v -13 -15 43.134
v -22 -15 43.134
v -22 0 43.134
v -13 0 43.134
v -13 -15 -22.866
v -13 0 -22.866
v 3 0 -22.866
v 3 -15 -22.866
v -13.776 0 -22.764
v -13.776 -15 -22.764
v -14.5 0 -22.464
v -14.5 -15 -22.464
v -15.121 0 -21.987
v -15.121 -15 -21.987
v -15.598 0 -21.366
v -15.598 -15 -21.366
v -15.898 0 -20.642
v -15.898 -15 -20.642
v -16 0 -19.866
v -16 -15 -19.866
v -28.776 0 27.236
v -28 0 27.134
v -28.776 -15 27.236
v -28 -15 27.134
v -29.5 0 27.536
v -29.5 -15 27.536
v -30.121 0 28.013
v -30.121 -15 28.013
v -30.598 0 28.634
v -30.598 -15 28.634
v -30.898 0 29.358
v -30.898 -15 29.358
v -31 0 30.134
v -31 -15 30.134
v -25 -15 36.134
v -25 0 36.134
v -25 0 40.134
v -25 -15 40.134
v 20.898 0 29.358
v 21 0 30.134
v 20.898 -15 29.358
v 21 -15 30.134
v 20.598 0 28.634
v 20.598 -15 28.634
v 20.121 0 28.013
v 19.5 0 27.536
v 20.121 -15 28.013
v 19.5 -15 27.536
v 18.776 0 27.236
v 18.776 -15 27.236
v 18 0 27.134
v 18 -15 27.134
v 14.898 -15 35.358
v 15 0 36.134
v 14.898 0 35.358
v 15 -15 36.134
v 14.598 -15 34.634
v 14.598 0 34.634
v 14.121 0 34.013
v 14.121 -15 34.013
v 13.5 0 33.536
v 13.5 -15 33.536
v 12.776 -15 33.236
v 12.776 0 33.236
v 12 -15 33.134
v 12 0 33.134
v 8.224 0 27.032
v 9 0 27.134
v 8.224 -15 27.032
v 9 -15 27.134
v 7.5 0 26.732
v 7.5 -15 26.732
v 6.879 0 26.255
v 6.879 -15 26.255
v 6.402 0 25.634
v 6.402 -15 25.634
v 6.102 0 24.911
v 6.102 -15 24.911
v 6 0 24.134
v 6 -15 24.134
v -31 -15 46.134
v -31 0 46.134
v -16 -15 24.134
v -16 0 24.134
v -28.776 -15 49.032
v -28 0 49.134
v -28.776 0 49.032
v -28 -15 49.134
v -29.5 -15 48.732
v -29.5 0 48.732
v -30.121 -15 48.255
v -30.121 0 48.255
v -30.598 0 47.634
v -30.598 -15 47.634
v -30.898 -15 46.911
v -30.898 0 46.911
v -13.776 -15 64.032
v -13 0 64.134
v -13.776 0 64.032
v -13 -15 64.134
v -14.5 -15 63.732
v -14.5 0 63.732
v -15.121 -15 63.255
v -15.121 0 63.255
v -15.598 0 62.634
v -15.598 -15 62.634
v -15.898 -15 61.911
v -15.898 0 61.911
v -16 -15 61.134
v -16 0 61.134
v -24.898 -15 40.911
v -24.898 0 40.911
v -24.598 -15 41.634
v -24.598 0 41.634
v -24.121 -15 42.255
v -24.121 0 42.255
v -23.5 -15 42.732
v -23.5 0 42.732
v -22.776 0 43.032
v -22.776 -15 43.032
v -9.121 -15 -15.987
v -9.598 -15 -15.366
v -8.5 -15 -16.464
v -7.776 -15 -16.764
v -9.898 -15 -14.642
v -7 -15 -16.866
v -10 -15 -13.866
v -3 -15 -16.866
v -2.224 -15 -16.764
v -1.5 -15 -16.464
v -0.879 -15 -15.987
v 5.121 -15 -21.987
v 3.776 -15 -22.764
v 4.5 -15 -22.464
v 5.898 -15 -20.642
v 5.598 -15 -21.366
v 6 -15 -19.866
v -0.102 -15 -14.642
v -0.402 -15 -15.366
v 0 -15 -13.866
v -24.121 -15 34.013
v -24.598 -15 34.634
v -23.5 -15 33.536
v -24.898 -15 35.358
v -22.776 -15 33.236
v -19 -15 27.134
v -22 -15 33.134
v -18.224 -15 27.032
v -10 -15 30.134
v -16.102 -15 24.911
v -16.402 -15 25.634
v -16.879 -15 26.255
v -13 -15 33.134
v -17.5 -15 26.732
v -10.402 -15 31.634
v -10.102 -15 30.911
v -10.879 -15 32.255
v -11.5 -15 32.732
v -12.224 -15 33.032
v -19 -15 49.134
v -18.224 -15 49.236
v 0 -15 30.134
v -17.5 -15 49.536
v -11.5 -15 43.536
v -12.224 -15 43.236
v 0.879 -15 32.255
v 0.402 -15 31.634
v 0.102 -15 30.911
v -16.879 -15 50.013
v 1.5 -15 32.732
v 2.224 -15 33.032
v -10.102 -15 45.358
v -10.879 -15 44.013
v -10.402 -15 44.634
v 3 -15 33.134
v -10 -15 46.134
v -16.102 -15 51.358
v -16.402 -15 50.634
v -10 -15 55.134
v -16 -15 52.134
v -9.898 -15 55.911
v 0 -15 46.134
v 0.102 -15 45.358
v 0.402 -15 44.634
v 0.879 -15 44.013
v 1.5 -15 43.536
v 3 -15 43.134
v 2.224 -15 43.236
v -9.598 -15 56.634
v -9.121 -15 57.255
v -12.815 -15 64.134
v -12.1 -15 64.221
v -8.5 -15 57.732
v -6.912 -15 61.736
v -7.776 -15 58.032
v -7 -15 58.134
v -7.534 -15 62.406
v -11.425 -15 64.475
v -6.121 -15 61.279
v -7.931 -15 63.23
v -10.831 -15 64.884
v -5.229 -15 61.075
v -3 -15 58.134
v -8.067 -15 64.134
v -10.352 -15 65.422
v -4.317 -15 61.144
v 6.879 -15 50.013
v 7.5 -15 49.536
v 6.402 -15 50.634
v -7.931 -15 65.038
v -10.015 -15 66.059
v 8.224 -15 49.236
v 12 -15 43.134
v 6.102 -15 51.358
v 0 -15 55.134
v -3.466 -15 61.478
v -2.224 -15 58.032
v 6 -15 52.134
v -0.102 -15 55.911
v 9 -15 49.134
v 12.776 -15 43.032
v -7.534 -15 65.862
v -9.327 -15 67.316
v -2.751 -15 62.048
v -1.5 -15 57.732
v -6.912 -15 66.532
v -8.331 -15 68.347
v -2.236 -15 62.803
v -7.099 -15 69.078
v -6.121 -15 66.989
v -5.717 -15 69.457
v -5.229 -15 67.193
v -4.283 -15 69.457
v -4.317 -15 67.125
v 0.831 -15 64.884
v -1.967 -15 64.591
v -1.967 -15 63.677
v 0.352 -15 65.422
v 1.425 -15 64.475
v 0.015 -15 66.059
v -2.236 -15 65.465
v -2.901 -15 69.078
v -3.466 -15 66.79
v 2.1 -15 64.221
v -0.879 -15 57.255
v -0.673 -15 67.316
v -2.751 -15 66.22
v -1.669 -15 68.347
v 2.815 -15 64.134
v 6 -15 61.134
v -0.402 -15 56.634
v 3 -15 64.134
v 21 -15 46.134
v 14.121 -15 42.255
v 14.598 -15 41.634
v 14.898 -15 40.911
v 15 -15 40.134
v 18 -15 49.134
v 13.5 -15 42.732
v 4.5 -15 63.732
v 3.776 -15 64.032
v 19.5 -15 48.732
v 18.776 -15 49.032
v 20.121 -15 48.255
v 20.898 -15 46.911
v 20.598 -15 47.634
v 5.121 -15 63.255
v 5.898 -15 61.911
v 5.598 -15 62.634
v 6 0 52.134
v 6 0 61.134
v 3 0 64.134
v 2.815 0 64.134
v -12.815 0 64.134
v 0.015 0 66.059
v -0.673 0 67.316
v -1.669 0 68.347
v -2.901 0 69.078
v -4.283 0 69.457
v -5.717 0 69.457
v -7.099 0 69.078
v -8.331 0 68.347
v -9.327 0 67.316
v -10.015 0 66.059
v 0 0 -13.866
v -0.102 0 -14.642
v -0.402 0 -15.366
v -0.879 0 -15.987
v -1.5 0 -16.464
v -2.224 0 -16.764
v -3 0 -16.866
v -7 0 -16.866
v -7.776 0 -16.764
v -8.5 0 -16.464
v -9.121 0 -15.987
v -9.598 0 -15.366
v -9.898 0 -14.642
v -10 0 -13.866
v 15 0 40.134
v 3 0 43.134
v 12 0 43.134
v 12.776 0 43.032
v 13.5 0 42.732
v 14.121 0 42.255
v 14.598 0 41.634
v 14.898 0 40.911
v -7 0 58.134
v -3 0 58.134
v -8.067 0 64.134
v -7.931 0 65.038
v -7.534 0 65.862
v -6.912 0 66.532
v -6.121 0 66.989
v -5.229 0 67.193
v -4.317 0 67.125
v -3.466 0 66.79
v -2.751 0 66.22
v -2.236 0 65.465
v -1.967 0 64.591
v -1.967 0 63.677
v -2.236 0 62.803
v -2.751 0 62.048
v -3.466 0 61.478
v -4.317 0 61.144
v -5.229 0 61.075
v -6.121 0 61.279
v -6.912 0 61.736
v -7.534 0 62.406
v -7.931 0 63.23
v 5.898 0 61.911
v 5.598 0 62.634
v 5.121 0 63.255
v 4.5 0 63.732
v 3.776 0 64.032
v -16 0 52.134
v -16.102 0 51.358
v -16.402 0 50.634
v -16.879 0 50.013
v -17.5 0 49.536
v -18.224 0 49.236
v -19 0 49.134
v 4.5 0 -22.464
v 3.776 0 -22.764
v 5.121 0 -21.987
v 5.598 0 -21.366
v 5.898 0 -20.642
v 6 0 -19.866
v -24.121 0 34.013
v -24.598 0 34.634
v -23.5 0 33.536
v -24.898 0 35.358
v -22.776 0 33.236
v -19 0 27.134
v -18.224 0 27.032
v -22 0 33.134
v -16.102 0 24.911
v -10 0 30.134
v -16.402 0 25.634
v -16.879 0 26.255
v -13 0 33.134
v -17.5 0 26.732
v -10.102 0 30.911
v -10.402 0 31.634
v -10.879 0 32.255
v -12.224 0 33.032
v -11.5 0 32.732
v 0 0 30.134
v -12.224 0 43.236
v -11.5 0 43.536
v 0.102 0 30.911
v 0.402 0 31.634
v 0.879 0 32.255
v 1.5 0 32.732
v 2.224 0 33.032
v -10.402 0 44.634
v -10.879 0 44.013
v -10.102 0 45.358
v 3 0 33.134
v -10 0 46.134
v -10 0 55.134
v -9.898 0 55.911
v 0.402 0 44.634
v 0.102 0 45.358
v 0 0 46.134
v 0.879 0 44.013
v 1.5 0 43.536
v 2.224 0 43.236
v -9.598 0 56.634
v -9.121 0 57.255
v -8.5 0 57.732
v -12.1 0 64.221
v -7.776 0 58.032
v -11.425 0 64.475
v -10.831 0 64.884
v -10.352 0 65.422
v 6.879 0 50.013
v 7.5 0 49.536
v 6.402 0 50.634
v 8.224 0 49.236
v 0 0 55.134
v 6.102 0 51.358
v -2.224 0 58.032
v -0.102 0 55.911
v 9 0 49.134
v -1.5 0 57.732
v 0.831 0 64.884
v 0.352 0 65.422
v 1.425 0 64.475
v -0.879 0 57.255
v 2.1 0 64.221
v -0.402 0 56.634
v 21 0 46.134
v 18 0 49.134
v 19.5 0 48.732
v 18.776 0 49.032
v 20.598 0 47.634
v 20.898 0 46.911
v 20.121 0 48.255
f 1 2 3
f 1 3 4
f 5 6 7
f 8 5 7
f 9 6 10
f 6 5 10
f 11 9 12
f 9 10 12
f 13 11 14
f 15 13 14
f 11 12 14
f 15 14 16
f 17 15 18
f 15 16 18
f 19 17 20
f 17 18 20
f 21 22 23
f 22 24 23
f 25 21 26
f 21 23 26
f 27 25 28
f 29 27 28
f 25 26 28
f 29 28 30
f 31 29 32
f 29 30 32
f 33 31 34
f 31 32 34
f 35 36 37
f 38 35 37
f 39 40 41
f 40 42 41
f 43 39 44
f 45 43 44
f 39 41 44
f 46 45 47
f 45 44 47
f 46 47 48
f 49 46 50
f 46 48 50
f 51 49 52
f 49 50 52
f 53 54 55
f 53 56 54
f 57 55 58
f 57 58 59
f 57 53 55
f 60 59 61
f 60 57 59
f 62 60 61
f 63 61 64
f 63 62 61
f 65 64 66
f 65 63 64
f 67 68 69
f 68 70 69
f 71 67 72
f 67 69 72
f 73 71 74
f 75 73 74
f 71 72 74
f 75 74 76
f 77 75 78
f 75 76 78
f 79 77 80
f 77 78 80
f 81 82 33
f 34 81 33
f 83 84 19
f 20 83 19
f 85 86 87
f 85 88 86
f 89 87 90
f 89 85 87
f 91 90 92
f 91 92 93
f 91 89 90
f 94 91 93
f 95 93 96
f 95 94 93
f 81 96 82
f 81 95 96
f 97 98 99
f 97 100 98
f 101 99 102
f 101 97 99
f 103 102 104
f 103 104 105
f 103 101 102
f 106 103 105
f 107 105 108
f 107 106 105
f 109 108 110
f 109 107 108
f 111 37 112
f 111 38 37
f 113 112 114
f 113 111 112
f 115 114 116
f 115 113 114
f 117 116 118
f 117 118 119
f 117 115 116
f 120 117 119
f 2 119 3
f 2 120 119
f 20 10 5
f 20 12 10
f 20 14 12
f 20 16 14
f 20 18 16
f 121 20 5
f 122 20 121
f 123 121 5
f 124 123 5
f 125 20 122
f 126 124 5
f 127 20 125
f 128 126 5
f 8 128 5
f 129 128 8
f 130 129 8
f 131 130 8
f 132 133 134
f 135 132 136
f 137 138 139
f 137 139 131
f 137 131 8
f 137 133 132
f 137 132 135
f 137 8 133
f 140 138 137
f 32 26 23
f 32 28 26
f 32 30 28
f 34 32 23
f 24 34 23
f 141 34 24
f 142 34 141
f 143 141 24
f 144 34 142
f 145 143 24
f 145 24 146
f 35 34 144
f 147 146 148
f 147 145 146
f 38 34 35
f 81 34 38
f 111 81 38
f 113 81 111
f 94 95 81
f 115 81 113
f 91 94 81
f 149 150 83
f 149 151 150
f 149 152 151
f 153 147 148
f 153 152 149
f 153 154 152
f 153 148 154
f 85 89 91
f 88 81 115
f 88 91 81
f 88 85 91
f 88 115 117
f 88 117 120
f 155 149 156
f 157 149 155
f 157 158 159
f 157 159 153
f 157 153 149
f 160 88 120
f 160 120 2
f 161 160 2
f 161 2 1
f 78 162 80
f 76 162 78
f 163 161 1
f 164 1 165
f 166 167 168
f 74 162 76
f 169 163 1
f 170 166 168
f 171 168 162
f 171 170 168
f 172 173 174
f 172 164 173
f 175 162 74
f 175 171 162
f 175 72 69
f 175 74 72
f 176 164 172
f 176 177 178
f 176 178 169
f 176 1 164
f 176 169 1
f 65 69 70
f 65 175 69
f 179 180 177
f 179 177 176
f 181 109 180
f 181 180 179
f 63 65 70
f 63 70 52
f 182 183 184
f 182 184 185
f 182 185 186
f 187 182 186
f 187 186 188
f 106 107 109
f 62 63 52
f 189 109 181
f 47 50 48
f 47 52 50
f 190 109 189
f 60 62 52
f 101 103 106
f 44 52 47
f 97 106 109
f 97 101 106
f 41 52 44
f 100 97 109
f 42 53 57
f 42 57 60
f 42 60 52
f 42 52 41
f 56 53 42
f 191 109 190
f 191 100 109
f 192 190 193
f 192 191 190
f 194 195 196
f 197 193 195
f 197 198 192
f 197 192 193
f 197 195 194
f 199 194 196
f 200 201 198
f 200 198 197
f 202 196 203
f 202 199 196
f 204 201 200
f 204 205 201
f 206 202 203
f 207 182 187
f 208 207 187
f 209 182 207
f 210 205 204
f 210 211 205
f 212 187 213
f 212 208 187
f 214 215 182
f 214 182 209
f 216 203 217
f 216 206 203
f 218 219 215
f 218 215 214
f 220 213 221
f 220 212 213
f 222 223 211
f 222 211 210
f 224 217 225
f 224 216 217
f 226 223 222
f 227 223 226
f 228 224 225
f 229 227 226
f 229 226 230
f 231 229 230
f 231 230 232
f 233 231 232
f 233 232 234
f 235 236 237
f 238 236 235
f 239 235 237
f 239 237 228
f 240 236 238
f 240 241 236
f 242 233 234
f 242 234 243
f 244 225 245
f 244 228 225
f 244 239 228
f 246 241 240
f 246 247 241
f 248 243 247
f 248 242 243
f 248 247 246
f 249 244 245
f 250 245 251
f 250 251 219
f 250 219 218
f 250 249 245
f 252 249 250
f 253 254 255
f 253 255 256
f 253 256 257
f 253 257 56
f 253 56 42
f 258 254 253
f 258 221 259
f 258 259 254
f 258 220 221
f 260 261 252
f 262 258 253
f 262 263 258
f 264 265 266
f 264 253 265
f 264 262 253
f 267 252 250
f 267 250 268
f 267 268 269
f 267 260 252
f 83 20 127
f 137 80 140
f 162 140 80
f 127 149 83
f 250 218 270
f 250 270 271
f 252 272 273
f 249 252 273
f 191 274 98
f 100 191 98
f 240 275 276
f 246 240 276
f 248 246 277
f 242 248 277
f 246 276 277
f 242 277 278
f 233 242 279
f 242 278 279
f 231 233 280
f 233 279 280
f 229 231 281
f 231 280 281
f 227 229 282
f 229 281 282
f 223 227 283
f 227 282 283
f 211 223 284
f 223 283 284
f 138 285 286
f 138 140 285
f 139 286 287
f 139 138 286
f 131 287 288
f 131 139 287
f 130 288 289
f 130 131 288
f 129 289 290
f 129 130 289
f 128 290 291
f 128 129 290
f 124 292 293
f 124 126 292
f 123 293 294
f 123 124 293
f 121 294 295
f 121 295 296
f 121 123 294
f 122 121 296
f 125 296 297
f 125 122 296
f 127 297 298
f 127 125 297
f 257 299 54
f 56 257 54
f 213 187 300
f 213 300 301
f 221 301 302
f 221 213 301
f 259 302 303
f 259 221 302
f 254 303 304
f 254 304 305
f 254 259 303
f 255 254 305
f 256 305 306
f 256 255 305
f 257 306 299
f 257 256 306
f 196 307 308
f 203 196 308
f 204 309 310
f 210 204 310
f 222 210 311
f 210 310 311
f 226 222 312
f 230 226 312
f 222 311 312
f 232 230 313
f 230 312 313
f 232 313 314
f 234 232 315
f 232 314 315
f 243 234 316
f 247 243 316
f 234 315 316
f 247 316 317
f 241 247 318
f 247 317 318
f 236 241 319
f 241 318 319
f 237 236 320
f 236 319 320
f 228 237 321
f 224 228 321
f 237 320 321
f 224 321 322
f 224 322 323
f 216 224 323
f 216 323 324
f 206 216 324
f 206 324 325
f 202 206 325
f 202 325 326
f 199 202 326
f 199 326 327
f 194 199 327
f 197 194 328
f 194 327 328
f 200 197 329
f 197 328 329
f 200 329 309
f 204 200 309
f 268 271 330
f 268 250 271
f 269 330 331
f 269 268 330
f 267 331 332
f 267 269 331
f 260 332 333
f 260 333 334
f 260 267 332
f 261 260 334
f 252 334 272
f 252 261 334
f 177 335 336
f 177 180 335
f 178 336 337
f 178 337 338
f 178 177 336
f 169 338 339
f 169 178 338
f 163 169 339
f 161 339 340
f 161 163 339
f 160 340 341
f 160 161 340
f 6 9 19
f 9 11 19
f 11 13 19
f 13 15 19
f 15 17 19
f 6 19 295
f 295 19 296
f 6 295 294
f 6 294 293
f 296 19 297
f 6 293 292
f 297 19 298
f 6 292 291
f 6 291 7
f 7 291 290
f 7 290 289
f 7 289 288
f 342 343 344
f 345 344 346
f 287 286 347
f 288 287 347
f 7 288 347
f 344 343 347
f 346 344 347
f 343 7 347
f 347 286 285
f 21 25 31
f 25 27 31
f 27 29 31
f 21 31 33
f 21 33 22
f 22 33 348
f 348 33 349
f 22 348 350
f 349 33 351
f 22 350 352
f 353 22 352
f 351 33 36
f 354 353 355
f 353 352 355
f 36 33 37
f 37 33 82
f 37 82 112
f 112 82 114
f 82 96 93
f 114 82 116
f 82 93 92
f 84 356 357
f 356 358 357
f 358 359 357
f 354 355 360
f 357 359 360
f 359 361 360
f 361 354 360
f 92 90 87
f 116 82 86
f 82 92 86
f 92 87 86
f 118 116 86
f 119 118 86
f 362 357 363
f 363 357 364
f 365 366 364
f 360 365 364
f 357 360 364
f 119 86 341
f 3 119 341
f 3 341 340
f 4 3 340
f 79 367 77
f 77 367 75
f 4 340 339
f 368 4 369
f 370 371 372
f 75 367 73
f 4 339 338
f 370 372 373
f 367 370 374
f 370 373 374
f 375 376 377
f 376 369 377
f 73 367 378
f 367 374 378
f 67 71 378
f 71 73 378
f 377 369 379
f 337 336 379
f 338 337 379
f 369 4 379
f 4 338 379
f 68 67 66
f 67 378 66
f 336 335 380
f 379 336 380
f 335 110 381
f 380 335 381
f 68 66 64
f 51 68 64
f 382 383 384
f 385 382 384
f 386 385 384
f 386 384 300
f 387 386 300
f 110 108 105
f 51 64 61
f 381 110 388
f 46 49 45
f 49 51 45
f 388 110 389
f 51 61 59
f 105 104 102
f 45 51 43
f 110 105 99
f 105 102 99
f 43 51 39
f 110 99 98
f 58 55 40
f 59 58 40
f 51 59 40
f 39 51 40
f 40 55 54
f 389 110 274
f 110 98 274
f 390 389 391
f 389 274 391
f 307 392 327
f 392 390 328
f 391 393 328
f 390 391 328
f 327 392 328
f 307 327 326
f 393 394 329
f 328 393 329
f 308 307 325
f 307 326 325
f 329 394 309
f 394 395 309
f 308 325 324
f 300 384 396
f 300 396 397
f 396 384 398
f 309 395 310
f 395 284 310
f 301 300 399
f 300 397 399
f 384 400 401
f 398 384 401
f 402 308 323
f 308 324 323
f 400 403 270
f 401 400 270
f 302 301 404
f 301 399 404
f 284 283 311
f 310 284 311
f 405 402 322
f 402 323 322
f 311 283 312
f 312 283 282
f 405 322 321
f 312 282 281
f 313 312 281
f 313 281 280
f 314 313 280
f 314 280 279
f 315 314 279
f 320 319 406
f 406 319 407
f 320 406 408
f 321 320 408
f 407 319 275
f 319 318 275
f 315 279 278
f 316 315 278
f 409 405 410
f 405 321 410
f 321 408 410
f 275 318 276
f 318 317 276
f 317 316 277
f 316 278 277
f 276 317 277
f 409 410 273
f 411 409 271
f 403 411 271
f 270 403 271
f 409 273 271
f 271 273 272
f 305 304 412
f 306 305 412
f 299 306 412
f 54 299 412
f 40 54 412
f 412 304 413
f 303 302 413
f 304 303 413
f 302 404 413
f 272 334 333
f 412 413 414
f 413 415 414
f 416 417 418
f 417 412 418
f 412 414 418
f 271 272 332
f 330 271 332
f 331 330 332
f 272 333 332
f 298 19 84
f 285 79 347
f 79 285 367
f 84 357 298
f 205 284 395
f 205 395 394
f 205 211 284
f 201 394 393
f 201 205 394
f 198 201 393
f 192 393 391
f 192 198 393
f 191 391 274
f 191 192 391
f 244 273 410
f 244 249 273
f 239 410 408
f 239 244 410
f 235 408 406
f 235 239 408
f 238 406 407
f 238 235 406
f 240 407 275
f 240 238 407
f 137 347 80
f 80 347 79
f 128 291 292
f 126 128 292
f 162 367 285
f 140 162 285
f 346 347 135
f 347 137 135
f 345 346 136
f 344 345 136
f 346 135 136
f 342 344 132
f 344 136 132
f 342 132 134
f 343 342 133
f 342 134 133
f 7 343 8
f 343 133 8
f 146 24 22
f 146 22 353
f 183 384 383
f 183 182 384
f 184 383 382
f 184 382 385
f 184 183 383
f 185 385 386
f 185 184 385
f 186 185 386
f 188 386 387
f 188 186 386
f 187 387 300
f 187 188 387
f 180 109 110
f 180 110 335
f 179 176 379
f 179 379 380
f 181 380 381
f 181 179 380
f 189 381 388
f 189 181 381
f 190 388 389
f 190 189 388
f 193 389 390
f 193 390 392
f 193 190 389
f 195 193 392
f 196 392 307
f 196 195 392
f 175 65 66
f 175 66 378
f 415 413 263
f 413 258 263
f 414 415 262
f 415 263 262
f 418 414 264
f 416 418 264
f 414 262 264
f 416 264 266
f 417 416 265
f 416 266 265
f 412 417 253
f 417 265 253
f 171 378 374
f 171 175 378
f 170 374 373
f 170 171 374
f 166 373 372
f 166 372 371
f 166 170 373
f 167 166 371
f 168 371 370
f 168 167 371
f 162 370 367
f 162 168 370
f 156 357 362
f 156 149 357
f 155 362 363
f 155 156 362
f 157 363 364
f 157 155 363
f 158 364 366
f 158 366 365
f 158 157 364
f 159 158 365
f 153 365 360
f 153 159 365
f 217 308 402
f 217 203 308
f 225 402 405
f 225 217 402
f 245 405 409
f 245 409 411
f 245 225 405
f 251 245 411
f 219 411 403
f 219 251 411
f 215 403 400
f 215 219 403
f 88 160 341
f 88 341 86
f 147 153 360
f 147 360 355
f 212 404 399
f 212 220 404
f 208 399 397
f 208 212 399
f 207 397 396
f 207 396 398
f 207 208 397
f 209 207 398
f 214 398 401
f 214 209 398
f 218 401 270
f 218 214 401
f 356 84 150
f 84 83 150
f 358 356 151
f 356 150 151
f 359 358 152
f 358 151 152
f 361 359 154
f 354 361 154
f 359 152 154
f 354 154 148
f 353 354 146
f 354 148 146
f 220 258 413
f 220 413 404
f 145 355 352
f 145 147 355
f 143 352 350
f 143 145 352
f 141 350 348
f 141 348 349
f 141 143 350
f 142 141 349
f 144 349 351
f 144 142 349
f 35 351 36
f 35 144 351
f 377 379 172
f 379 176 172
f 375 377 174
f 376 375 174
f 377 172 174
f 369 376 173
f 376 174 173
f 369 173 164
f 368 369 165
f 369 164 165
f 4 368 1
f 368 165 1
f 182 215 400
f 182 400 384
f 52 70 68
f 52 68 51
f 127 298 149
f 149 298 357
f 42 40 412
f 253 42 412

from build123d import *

# Parameters (mm, degrees)
F1_DEPTH = 15
F2_R     = 3
F3_R     = 3
F4_R     = 3


with BuildPart() as f1:
    # F0 (on Front) → F1 (new body)
    with BuildSketch(Plane.XZ):
        with BuildLine():
            Line((-16, 27.1340573728), (-16, -16.8659426272))
            Line((-16, -16.8659426272), (-16, -22.8659426272))
            Line((-16, -22.8659426272), (6, -22.8659426272))
            Line((6, -22.8659426272), (6, 27.1340573728))
            Line((6, 27.1340573728), (15, 27.1340573728))
            Line((15, 27.1340573728), (21, 27.1340573728))
            Line((21, 27.1340573728), (21, 49.1340573728))
            Line((21, 49.1340573728), (6, 49.1340573728))
            Line((6, 49.1340573728), (6, 64.1340573728))
            Line((6, 64.1340573728), (0.3713240896, 64.1340573728))
            ThreePointArc((0.3713240896, 64.1340573728), (-5, 58.7627332832), (-10.3713240896, 64.1340573728))
            Line((-10.3713240896, 64.1340573728), (-16, 64.1340573728))
            Line((-16, 64.1340573728), (-16, 49.1340573728))
            Line((-16, 49.1340573728), (-31, 49.1340573728))
            Line((-31, 49.1340573728), (-31, 27.1340573728))
            Line((-31, 27.1340573728), (-25, 27.1340573728))
            Line((-25, 27.1340573728), (-16, 27.1340573728))
        make_face()
        Polygon((-10, 58.1340573728), (0, 58.1340573728), (0, 43.1340573728), (15, 43.1340573728), (15, 33.1340573728), (0, 33.1340573728), (0, -16.8659426272), (-10, -16.8659426272), (-10, 33.1340573728), (-25, 33.1340573728), (-25, 43.1340573728), (-10, 43.1340573728), align=None, mode=Mode.SUBTRACT)
        with BuildLine():
            ThreePointArc((0.3713240896, 64.1340573728), (-5, 69.5053814624), (-10.3713240896, 64.1340573728))
            Line((-10.3713240896, 64.1340573728), (-8.0673756686, 64.1340573728))
            ThreePointArc((-8.0673756686, 64.1340573728), (-5, 67.2014330414), (-1.9326243314, 64.1340573728))
            Line((-1.9326243314, 64.1340573728), (0.3713240896, 64.1340573728))
        make_face()
        with BuildLine():
            Line((-8.0673756686, 64.1340573728), (-10.3713240896, 64.1340573728))
            ThreePointArc((-10.3713240896, 64.1340573728), (-5, 58.7627332832), (0.3713240896, 64.1340573728))
            Line((0.3713240896, 64.1340573728), (-1.9326243314, 64.1340573728))
            ThreePointArc((-1.9326243314, 64.1340573728), (-5, 61.0666817042), (-8.0673756686, 64.1340573728))
        make_face()
    extrude(amount=F1_DEPTH)

    # F2
    f2_edges = [f1.edges().sort_by_distance(p)[0] for p in [
        (-10, -7.5, -16.865943),
        (-10, -7.5, 33.134057),
        (-25, -7.5, 33.134057),
        (0, -7.5, -16.865943),
        (0, -7.5, 33.134057),
        (15, -7.5, 33.134057),
        (15, -7.5, 43.134057),
        (0, -7.5, 43.134057),
        (0, -7.5, 58.134057),
        (-10, -7.5, 58.134057),
        (-10, -7.5, 43.134057),
        (-25, -7.5, 43.134057),
    ]]
    fillet(f2_edges, radius=F2_R)

    # F3
    f3_edges = [f1.edges().sort_by_distance(p)[0] for p in [
        (6, -7.5, 49.134057),
    ]]
    fillet(f3_edges, radius=F3_R)

    # F4
    f4_edges = [f1.edges().sort_by_distance(p)[0] for p in [
        (6, -7.5, 64.134057),
        (0.371324, -7.5, 64.134057),
        (21, -7.5, 27.134057),
        (6, -7.5, 27.134057),
        (6, -7.5, -22.865943),
        (-16, -7.5, -22.865943),
        (-16, -7.5, 27.134057),
        (-31, -7.5, 27.134057),
        (-10.371324, -7.5, 64.134057),
        (-16, -7.5, 64.134057),
        (-16, -7.5, 49.134057),
        (21, -7.5, 49.134057),
        (-31, -7.5, 49.134057),
    ]]
    fillet(f4_edges, radius=F4_R)


solid = f1.part
